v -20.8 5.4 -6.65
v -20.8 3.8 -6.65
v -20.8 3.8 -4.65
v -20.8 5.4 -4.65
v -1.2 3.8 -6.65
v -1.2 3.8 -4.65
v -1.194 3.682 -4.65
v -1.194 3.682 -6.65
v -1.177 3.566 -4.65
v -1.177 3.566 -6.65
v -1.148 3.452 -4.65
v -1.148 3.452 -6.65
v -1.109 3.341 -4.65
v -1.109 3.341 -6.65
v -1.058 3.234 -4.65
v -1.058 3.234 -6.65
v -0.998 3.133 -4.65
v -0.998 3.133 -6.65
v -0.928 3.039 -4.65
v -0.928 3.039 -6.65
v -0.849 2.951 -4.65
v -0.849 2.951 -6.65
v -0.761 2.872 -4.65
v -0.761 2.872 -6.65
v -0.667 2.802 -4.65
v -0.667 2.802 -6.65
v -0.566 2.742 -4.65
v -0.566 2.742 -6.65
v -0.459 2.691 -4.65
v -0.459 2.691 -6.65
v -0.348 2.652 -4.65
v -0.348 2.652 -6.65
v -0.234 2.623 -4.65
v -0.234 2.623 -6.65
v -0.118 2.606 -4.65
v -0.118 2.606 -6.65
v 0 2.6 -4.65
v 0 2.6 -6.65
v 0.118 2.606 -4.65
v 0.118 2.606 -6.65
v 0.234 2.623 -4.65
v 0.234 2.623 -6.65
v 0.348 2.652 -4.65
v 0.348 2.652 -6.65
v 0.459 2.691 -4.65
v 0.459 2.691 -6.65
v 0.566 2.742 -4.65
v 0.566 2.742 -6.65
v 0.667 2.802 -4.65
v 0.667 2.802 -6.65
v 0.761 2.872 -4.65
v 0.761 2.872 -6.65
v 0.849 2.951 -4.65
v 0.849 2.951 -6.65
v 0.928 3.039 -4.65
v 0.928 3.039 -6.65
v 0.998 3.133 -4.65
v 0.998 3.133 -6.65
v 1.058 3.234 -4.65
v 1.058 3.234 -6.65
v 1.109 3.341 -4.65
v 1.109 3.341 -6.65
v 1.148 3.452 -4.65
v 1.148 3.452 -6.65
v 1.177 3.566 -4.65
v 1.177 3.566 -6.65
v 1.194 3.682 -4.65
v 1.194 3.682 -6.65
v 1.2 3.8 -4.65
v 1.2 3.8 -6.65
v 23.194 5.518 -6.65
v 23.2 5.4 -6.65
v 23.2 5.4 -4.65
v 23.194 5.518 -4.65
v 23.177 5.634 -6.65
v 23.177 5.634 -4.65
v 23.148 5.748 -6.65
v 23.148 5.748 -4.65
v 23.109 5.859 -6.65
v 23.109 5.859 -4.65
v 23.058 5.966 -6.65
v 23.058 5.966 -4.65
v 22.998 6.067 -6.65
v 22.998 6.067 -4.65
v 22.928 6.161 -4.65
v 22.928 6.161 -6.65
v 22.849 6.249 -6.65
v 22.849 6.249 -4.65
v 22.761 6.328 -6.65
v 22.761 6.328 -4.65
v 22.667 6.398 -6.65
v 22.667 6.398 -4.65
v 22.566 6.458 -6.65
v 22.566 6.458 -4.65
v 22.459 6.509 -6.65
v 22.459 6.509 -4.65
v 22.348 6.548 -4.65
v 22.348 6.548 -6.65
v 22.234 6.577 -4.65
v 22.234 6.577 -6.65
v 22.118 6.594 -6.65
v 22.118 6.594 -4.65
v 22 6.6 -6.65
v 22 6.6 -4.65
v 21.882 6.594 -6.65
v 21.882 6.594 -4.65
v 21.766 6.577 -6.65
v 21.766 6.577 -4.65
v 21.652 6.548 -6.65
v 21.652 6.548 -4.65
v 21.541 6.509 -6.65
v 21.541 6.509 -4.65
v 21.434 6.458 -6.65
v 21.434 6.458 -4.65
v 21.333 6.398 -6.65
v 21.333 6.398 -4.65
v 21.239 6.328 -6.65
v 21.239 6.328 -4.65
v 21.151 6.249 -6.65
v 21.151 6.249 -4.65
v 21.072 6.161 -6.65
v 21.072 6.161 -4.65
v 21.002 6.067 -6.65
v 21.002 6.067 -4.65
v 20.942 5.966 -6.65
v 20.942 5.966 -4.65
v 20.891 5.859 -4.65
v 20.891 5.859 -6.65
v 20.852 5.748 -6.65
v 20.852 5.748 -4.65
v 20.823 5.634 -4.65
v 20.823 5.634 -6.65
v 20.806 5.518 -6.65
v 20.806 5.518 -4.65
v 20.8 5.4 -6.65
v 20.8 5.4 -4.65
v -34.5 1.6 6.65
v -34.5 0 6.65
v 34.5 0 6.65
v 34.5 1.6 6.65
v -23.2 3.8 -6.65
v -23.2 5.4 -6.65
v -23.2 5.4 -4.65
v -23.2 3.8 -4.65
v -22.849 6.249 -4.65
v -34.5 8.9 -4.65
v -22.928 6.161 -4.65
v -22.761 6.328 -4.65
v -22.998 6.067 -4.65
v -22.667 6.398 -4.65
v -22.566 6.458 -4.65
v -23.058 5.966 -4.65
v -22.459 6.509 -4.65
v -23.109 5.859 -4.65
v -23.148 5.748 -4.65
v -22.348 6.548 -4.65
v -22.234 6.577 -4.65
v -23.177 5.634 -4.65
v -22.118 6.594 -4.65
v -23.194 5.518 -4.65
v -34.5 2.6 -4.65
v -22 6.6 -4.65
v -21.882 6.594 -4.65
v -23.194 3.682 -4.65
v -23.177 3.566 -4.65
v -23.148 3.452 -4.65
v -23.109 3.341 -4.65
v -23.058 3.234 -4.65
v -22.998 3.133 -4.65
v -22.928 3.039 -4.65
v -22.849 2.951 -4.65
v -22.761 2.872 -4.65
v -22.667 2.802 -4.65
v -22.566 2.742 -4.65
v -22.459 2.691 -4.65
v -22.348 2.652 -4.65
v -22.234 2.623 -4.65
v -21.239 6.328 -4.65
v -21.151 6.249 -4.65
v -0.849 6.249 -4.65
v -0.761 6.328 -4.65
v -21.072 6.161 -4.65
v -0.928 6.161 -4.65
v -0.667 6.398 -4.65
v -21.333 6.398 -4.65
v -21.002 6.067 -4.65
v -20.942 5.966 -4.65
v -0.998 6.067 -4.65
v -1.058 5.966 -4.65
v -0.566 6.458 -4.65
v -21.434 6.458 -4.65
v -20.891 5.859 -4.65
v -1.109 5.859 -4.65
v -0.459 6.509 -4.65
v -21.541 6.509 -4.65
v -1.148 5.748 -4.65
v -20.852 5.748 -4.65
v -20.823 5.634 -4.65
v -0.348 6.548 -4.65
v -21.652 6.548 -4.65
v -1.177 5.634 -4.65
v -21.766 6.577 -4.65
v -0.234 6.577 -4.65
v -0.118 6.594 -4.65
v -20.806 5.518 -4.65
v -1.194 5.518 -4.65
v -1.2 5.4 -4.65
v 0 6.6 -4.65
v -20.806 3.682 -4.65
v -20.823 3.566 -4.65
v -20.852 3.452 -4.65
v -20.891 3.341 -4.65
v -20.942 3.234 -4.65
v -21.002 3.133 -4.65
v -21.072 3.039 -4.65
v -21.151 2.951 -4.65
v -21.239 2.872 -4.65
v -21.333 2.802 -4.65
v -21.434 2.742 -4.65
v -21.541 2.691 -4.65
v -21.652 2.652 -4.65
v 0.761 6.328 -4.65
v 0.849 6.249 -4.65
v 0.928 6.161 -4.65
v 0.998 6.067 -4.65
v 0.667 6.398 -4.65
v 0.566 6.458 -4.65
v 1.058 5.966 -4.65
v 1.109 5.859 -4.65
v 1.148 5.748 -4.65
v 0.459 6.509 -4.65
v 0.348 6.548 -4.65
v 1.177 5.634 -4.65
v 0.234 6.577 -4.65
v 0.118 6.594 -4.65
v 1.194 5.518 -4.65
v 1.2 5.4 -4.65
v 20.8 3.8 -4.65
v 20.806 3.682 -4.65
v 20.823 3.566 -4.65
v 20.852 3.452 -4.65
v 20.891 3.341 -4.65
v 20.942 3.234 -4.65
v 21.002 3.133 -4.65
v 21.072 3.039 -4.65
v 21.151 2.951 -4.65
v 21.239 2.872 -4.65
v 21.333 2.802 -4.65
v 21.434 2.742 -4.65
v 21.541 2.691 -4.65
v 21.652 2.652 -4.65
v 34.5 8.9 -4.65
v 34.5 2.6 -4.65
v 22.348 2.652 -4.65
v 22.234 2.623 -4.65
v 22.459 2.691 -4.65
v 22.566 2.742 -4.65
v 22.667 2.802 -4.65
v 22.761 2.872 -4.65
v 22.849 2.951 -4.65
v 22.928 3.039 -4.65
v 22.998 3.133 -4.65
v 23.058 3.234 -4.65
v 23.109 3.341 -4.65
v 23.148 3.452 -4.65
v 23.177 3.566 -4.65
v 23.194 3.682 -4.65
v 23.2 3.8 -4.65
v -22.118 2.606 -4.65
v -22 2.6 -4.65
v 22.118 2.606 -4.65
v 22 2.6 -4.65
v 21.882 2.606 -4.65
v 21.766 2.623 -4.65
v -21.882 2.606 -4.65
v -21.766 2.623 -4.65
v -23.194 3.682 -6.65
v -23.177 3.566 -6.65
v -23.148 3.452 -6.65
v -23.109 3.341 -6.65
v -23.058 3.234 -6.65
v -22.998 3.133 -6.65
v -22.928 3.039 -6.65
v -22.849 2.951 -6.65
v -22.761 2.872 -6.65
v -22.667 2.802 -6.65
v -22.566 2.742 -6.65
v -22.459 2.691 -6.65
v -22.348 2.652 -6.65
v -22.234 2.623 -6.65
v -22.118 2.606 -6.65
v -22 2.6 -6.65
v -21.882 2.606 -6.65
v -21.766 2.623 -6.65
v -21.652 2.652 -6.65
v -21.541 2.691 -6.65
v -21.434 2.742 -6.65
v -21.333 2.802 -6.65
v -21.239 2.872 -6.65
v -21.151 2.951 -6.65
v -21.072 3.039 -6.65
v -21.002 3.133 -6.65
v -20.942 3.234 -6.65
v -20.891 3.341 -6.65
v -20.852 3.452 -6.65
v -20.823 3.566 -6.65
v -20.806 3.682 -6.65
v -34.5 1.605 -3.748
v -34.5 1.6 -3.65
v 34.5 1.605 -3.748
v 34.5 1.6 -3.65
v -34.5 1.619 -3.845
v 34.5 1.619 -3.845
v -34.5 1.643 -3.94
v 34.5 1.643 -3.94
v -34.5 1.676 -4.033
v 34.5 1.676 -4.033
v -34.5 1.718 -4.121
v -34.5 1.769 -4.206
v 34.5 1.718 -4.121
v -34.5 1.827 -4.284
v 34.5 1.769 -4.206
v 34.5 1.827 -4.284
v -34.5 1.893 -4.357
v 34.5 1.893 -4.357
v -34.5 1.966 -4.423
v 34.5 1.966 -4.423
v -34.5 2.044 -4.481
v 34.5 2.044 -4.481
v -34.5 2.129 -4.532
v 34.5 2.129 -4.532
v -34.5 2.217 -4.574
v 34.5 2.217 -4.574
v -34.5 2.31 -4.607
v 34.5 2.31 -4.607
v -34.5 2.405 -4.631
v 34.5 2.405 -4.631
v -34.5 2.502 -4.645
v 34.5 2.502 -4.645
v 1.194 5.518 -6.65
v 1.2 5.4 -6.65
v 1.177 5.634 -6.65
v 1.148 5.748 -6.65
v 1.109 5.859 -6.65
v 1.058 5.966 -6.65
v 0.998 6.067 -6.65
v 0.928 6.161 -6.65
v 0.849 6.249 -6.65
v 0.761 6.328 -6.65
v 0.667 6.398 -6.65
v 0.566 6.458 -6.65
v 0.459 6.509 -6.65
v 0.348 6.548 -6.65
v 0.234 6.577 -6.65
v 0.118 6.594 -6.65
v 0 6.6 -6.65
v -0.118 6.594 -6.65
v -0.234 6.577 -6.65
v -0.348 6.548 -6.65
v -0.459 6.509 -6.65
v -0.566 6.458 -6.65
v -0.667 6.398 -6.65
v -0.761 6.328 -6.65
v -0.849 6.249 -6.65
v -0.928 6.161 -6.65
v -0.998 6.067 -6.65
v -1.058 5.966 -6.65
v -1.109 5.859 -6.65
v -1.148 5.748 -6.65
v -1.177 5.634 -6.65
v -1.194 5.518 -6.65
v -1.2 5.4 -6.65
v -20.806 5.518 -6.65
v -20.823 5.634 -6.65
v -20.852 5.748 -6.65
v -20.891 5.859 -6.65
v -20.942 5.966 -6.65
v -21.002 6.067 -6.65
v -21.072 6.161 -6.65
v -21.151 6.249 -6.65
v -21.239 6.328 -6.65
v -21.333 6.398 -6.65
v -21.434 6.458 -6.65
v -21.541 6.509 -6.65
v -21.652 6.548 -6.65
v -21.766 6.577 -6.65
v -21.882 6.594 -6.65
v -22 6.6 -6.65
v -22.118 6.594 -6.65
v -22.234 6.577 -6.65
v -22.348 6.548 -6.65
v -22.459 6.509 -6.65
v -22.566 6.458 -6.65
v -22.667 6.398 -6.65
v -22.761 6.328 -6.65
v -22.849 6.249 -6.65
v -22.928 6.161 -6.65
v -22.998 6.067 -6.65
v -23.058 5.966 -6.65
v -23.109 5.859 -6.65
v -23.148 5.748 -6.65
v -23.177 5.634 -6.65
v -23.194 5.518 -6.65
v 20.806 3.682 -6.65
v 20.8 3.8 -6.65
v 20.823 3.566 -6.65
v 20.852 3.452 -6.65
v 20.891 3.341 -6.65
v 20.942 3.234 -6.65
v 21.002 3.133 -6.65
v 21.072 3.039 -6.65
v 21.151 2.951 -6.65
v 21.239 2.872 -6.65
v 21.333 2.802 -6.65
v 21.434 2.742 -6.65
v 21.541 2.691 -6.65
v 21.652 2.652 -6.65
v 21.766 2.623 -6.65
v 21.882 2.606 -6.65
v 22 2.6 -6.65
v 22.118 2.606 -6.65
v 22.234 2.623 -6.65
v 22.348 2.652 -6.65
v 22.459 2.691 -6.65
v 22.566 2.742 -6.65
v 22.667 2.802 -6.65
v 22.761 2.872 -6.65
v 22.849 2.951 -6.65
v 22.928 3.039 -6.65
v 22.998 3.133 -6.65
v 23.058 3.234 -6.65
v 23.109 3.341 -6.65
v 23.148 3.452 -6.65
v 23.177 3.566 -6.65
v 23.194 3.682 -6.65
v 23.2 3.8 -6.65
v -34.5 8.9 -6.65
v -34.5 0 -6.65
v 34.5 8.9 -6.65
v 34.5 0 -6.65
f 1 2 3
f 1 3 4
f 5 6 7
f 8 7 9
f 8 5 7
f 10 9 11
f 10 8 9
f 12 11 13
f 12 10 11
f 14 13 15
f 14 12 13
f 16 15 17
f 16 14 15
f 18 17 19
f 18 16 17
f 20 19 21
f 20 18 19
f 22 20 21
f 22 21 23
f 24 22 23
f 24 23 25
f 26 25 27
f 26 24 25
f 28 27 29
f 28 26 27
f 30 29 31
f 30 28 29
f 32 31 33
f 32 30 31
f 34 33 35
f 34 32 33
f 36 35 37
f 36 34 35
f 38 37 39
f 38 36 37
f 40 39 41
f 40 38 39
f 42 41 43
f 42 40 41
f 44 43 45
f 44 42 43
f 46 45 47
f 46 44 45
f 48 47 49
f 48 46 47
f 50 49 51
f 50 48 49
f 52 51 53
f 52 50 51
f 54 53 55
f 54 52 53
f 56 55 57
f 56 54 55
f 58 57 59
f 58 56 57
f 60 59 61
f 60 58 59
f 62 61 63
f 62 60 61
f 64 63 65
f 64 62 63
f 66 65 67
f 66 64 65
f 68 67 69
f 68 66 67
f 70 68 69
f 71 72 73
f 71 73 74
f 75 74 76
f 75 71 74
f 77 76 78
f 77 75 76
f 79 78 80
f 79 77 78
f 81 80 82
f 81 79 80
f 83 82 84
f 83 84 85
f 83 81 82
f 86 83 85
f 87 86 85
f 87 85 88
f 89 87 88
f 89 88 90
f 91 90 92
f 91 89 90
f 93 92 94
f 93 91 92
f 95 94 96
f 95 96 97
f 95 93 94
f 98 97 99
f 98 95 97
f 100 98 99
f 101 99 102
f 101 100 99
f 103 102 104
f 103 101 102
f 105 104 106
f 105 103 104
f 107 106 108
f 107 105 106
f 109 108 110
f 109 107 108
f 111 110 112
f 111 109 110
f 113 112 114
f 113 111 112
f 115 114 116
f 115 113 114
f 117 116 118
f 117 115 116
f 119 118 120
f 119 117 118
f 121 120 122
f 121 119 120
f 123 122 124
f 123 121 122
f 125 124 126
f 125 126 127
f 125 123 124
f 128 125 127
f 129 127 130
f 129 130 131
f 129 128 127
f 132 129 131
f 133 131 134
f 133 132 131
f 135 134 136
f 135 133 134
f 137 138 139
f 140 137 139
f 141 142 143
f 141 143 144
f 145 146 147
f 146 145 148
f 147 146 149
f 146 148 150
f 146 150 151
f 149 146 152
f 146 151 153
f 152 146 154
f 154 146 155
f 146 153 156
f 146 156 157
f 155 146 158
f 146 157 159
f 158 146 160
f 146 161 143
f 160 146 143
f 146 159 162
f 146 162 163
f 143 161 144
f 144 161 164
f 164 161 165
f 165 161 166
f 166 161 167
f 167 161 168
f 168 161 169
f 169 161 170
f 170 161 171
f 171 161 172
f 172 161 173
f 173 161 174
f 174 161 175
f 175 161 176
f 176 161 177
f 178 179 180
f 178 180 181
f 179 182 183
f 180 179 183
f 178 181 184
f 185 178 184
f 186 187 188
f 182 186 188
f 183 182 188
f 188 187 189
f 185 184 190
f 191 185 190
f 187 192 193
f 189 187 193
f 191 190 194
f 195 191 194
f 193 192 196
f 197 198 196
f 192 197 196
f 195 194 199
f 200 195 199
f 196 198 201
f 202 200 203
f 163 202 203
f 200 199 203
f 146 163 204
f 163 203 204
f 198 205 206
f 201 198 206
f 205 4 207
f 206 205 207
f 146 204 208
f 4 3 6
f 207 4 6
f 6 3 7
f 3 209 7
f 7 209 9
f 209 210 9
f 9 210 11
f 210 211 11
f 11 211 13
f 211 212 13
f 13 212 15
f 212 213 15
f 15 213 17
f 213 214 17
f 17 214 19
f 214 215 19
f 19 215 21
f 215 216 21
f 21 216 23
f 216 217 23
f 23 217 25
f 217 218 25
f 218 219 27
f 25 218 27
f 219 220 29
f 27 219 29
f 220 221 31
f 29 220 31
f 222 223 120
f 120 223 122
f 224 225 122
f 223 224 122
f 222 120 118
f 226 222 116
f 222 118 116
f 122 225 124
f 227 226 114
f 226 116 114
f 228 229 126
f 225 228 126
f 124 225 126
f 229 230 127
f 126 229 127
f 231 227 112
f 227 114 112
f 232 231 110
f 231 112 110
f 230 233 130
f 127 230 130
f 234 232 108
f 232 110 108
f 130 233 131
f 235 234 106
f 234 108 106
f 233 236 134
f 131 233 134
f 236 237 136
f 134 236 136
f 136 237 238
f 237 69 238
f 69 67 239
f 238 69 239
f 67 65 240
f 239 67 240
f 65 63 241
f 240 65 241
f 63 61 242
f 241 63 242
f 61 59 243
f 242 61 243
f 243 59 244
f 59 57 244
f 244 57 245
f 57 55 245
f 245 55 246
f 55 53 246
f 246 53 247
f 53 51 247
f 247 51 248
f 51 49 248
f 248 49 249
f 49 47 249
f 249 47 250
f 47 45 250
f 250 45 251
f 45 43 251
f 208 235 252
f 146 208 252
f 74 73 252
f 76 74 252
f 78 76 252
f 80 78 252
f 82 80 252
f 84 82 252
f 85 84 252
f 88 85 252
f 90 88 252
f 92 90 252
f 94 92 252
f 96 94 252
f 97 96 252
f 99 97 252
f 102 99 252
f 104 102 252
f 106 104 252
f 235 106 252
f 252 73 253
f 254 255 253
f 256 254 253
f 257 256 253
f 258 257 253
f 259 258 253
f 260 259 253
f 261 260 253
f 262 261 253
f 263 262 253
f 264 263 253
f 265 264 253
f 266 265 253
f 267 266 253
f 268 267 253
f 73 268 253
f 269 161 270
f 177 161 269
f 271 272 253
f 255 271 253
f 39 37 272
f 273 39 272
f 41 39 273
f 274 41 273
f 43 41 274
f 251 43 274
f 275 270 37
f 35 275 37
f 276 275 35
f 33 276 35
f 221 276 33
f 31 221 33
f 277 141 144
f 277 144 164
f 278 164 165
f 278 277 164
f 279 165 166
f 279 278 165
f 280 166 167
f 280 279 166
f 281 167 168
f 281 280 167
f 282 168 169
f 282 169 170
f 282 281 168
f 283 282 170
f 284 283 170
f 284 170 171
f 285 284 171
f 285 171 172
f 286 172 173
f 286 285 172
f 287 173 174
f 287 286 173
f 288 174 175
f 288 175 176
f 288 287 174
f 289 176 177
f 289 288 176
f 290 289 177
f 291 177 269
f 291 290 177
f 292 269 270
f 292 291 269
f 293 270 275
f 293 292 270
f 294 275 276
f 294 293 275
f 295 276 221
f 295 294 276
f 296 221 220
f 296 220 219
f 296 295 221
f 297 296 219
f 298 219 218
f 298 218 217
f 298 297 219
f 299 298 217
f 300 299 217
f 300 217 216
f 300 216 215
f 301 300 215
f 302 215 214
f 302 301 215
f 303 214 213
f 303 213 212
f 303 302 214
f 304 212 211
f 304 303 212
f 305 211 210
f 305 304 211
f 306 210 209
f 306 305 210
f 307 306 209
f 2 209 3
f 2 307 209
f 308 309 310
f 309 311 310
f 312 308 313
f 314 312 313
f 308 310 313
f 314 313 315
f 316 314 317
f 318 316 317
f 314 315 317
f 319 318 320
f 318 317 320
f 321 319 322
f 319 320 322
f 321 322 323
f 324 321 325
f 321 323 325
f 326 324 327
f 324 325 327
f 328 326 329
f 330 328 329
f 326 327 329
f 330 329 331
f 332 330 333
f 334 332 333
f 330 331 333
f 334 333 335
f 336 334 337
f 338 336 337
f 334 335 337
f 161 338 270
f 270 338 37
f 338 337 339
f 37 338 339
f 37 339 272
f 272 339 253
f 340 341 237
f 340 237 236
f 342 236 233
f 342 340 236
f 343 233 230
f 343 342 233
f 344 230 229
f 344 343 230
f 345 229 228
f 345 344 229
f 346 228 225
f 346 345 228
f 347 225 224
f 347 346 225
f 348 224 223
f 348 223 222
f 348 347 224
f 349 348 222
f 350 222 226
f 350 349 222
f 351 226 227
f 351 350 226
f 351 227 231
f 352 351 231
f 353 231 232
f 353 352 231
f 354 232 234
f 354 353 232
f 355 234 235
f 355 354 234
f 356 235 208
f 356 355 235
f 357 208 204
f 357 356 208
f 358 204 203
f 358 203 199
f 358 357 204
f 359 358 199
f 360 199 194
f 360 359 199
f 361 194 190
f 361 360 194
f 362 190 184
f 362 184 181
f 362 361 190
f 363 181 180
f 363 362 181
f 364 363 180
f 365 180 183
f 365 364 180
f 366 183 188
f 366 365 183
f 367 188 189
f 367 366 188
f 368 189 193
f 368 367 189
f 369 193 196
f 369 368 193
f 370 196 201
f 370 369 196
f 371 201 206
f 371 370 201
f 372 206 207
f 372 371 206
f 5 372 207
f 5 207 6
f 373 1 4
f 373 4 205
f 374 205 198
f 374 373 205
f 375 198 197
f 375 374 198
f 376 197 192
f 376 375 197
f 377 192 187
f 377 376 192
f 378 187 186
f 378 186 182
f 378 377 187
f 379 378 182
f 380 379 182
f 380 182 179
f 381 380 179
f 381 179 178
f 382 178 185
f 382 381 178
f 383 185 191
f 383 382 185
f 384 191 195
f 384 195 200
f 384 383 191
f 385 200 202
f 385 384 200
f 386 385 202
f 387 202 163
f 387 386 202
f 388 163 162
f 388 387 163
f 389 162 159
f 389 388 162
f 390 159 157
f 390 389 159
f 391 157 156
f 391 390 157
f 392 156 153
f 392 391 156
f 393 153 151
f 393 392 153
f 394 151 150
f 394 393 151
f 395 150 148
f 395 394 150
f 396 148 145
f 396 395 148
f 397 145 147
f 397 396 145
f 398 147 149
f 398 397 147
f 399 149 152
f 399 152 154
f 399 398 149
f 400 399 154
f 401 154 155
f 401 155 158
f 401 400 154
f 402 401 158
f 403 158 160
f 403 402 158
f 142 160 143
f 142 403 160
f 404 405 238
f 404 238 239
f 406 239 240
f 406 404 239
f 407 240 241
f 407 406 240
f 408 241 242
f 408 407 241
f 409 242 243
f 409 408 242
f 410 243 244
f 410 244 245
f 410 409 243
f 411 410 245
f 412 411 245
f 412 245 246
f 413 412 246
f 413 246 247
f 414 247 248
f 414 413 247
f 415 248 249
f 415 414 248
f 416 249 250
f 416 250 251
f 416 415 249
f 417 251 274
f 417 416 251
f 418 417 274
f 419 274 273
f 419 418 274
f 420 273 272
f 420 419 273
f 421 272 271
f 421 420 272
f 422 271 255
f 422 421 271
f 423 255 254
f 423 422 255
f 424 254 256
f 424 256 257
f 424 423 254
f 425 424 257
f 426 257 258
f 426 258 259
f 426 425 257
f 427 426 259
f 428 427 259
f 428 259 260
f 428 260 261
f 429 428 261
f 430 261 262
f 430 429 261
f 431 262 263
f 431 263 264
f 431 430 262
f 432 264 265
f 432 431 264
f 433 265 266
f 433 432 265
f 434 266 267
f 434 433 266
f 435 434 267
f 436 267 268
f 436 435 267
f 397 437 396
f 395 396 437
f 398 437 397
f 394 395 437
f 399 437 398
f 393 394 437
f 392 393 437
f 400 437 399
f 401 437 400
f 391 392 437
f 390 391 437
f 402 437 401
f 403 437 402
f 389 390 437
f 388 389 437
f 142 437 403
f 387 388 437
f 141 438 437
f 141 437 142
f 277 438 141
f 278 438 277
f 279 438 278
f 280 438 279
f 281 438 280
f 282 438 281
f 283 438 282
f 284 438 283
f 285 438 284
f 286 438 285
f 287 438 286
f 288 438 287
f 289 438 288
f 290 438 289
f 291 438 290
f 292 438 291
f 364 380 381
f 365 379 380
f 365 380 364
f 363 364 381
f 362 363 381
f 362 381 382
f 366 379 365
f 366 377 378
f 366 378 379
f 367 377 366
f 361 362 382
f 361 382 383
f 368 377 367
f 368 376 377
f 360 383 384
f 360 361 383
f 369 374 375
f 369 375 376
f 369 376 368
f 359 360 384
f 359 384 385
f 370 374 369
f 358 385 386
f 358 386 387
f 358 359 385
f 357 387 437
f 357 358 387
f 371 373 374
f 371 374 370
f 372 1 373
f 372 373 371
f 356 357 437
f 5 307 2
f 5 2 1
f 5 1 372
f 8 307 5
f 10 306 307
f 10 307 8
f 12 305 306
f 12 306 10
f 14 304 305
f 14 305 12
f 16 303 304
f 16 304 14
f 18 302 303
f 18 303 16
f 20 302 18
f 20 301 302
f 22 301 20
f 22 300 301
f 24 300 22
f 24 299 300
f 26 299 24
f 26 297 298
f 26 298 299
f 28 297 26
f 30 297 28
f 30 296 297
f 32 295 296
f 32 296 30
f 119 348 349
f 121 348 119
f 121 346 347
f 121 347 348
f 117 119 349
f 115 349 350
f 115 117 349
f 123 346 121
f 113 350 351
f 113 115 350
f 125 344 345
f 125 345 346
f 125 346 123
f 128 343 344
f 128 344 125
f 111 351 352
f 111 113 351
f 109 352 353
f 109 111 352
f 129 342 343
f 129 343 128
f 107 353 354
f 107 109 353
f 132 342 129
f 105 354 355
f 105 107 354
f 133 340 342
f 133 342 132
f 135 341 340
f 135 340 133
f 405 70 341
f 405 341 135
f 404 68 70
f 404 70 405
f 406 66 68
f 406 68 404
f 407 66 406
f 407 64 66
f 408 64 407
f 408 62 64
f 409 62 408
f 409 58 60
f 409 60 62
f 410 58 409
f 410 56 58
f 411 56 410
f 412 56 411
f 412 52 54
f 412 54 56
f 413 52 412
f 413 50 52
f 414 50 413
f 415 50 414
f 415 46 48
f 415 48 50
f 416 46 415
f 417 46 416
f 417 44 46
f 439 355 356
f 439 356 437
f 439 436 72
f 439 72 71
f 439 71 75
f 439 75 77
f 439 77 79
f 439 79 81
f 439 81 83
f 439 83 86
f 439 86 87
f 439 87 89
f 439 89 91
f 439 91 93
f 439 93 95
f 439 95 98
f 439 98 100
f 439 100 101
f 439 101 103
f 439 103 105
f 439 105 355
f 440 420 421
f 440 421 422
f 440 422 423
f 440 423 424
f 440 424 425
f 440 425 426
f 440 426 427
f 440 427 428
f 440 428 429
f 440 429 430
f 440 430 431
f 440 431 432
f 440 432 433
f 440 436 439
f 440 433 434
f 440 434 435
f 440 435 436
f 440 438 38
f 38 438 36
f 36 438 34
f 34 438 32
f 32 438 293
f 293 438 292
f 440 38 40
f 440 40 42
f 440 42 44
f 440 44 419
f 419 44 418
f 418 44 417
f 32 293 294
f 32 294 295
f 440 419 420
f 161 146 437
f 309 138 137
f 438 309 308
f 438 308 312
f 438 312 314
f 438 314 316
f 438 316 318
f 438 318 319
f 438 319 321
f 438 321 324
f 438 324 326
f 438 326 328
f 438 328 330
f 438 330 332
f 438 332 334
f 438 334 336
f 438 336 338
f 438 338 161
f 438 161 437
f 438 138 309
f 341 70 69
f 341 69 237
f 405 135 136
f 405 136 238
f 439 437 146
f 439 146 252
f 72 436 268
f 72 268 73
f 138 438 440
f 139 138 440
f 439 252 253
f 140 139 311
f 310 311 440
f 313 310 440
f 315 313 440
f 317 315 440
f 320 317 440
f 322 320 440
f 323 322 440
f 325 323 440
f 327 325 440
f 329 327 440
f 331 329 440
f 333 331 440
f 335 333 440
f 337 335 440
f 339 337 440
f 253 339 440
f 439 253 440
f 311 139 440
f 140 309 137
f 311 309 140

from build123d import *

# Parameters (mm, degrees)
SKETCH1_W                = 69
SKETCH1_H                = 13.3
BOSS_EXTRUDE1_DEPTH      = 1.6
SKETCH2_W                = 69
SKETCH2_H                = 2
BOSS_EXTRUDE2_DEPTH      = 7.3
FILLET1_R                = 1
M2_START                 = -6.65
M2_CLEARANCE_SLOT1_DEPTH = 2


# Read off the part's stored shape, not the designer's step: M2 Clearance Slot1
with BuildPart() as part:
    # Sketch1 → Boss-Extrude1 (new body)
    with BuildSketch(Plane(origin=(0, 0, 0), x_dir=(1, 0, 0), z_dir=(0, 1, 0))):
        Rectangle(SKETCH1_W, SKETCH1_H)
    extrude(amount=BOSS_EXTRUDE1_DEPTH)

    # Sketch2 → Boss-Extrude2 (add)
    with BuildSketch(Plane(origin=(0, 1.6, 0), x_dir=(1, 0, 0), z_dir=(0, 1, 0))):
        with Locations((0, 5.65)):
            Rectangle(SKETCH2_W, SKETCH2_H)
    extrude(amount=BOSS_EXTRUDE2_DEPTH)

    # Fillet1
    fillet1_edges = [part.edges().sort_by_distance(p)[0] for p in [
        (0, 1.6, -4.65),
    ]]
    fillet(fillet1_edges, radius=FILLET1_R)

    # M2 Clearance Slot1 outline → M2 Clearance Slot1 (cut)
    with BuildSketch(Plane.XY.offset(M2_START)):
        with BuildLine():
            Line((23.2, 3.8), (23.2, 5.4))
            ThreePointArc((23.2, 5.4), (22, 6.6), (20.8, 5.4))
            Line((20.8, 5.4), (20.8, 3.8))
            ThreePointArc((20.8, 3.8), (22, 2.6), (23.2, 3.8))
        make_face()
        with BuildLine():
            Line((1.2, 3.8), (1.2, 5.4))
            ThreePointArc((1.2, 5.4), (0, 6.6), (-1.2, 5.4))
            Line((-1.2, 5.4), (-1.2, 3.8))
            ThreePointArc((-1.2, 3.8), (0, 2.6), (1.2, 3.8))
        make_face()
        with BuildLine():
            Line((-20.8, 3.8), (-20.8, 5.4))
            ThreePointArc((-20.8, 5.4), (-22, 6.6), (-23.2, 5.4))
            Line((-23.2, 5.4), (-23.2, 3.8))
            ThreePointArc((-23.2, 3.8), (-22, 2.6), (-20.8, 3.8))
        make_face()
    extrude(amount=M2_CLEARANCE_SLOT1_DEPTH, mode=Mode.SUBTRACT)


solid = part.part
